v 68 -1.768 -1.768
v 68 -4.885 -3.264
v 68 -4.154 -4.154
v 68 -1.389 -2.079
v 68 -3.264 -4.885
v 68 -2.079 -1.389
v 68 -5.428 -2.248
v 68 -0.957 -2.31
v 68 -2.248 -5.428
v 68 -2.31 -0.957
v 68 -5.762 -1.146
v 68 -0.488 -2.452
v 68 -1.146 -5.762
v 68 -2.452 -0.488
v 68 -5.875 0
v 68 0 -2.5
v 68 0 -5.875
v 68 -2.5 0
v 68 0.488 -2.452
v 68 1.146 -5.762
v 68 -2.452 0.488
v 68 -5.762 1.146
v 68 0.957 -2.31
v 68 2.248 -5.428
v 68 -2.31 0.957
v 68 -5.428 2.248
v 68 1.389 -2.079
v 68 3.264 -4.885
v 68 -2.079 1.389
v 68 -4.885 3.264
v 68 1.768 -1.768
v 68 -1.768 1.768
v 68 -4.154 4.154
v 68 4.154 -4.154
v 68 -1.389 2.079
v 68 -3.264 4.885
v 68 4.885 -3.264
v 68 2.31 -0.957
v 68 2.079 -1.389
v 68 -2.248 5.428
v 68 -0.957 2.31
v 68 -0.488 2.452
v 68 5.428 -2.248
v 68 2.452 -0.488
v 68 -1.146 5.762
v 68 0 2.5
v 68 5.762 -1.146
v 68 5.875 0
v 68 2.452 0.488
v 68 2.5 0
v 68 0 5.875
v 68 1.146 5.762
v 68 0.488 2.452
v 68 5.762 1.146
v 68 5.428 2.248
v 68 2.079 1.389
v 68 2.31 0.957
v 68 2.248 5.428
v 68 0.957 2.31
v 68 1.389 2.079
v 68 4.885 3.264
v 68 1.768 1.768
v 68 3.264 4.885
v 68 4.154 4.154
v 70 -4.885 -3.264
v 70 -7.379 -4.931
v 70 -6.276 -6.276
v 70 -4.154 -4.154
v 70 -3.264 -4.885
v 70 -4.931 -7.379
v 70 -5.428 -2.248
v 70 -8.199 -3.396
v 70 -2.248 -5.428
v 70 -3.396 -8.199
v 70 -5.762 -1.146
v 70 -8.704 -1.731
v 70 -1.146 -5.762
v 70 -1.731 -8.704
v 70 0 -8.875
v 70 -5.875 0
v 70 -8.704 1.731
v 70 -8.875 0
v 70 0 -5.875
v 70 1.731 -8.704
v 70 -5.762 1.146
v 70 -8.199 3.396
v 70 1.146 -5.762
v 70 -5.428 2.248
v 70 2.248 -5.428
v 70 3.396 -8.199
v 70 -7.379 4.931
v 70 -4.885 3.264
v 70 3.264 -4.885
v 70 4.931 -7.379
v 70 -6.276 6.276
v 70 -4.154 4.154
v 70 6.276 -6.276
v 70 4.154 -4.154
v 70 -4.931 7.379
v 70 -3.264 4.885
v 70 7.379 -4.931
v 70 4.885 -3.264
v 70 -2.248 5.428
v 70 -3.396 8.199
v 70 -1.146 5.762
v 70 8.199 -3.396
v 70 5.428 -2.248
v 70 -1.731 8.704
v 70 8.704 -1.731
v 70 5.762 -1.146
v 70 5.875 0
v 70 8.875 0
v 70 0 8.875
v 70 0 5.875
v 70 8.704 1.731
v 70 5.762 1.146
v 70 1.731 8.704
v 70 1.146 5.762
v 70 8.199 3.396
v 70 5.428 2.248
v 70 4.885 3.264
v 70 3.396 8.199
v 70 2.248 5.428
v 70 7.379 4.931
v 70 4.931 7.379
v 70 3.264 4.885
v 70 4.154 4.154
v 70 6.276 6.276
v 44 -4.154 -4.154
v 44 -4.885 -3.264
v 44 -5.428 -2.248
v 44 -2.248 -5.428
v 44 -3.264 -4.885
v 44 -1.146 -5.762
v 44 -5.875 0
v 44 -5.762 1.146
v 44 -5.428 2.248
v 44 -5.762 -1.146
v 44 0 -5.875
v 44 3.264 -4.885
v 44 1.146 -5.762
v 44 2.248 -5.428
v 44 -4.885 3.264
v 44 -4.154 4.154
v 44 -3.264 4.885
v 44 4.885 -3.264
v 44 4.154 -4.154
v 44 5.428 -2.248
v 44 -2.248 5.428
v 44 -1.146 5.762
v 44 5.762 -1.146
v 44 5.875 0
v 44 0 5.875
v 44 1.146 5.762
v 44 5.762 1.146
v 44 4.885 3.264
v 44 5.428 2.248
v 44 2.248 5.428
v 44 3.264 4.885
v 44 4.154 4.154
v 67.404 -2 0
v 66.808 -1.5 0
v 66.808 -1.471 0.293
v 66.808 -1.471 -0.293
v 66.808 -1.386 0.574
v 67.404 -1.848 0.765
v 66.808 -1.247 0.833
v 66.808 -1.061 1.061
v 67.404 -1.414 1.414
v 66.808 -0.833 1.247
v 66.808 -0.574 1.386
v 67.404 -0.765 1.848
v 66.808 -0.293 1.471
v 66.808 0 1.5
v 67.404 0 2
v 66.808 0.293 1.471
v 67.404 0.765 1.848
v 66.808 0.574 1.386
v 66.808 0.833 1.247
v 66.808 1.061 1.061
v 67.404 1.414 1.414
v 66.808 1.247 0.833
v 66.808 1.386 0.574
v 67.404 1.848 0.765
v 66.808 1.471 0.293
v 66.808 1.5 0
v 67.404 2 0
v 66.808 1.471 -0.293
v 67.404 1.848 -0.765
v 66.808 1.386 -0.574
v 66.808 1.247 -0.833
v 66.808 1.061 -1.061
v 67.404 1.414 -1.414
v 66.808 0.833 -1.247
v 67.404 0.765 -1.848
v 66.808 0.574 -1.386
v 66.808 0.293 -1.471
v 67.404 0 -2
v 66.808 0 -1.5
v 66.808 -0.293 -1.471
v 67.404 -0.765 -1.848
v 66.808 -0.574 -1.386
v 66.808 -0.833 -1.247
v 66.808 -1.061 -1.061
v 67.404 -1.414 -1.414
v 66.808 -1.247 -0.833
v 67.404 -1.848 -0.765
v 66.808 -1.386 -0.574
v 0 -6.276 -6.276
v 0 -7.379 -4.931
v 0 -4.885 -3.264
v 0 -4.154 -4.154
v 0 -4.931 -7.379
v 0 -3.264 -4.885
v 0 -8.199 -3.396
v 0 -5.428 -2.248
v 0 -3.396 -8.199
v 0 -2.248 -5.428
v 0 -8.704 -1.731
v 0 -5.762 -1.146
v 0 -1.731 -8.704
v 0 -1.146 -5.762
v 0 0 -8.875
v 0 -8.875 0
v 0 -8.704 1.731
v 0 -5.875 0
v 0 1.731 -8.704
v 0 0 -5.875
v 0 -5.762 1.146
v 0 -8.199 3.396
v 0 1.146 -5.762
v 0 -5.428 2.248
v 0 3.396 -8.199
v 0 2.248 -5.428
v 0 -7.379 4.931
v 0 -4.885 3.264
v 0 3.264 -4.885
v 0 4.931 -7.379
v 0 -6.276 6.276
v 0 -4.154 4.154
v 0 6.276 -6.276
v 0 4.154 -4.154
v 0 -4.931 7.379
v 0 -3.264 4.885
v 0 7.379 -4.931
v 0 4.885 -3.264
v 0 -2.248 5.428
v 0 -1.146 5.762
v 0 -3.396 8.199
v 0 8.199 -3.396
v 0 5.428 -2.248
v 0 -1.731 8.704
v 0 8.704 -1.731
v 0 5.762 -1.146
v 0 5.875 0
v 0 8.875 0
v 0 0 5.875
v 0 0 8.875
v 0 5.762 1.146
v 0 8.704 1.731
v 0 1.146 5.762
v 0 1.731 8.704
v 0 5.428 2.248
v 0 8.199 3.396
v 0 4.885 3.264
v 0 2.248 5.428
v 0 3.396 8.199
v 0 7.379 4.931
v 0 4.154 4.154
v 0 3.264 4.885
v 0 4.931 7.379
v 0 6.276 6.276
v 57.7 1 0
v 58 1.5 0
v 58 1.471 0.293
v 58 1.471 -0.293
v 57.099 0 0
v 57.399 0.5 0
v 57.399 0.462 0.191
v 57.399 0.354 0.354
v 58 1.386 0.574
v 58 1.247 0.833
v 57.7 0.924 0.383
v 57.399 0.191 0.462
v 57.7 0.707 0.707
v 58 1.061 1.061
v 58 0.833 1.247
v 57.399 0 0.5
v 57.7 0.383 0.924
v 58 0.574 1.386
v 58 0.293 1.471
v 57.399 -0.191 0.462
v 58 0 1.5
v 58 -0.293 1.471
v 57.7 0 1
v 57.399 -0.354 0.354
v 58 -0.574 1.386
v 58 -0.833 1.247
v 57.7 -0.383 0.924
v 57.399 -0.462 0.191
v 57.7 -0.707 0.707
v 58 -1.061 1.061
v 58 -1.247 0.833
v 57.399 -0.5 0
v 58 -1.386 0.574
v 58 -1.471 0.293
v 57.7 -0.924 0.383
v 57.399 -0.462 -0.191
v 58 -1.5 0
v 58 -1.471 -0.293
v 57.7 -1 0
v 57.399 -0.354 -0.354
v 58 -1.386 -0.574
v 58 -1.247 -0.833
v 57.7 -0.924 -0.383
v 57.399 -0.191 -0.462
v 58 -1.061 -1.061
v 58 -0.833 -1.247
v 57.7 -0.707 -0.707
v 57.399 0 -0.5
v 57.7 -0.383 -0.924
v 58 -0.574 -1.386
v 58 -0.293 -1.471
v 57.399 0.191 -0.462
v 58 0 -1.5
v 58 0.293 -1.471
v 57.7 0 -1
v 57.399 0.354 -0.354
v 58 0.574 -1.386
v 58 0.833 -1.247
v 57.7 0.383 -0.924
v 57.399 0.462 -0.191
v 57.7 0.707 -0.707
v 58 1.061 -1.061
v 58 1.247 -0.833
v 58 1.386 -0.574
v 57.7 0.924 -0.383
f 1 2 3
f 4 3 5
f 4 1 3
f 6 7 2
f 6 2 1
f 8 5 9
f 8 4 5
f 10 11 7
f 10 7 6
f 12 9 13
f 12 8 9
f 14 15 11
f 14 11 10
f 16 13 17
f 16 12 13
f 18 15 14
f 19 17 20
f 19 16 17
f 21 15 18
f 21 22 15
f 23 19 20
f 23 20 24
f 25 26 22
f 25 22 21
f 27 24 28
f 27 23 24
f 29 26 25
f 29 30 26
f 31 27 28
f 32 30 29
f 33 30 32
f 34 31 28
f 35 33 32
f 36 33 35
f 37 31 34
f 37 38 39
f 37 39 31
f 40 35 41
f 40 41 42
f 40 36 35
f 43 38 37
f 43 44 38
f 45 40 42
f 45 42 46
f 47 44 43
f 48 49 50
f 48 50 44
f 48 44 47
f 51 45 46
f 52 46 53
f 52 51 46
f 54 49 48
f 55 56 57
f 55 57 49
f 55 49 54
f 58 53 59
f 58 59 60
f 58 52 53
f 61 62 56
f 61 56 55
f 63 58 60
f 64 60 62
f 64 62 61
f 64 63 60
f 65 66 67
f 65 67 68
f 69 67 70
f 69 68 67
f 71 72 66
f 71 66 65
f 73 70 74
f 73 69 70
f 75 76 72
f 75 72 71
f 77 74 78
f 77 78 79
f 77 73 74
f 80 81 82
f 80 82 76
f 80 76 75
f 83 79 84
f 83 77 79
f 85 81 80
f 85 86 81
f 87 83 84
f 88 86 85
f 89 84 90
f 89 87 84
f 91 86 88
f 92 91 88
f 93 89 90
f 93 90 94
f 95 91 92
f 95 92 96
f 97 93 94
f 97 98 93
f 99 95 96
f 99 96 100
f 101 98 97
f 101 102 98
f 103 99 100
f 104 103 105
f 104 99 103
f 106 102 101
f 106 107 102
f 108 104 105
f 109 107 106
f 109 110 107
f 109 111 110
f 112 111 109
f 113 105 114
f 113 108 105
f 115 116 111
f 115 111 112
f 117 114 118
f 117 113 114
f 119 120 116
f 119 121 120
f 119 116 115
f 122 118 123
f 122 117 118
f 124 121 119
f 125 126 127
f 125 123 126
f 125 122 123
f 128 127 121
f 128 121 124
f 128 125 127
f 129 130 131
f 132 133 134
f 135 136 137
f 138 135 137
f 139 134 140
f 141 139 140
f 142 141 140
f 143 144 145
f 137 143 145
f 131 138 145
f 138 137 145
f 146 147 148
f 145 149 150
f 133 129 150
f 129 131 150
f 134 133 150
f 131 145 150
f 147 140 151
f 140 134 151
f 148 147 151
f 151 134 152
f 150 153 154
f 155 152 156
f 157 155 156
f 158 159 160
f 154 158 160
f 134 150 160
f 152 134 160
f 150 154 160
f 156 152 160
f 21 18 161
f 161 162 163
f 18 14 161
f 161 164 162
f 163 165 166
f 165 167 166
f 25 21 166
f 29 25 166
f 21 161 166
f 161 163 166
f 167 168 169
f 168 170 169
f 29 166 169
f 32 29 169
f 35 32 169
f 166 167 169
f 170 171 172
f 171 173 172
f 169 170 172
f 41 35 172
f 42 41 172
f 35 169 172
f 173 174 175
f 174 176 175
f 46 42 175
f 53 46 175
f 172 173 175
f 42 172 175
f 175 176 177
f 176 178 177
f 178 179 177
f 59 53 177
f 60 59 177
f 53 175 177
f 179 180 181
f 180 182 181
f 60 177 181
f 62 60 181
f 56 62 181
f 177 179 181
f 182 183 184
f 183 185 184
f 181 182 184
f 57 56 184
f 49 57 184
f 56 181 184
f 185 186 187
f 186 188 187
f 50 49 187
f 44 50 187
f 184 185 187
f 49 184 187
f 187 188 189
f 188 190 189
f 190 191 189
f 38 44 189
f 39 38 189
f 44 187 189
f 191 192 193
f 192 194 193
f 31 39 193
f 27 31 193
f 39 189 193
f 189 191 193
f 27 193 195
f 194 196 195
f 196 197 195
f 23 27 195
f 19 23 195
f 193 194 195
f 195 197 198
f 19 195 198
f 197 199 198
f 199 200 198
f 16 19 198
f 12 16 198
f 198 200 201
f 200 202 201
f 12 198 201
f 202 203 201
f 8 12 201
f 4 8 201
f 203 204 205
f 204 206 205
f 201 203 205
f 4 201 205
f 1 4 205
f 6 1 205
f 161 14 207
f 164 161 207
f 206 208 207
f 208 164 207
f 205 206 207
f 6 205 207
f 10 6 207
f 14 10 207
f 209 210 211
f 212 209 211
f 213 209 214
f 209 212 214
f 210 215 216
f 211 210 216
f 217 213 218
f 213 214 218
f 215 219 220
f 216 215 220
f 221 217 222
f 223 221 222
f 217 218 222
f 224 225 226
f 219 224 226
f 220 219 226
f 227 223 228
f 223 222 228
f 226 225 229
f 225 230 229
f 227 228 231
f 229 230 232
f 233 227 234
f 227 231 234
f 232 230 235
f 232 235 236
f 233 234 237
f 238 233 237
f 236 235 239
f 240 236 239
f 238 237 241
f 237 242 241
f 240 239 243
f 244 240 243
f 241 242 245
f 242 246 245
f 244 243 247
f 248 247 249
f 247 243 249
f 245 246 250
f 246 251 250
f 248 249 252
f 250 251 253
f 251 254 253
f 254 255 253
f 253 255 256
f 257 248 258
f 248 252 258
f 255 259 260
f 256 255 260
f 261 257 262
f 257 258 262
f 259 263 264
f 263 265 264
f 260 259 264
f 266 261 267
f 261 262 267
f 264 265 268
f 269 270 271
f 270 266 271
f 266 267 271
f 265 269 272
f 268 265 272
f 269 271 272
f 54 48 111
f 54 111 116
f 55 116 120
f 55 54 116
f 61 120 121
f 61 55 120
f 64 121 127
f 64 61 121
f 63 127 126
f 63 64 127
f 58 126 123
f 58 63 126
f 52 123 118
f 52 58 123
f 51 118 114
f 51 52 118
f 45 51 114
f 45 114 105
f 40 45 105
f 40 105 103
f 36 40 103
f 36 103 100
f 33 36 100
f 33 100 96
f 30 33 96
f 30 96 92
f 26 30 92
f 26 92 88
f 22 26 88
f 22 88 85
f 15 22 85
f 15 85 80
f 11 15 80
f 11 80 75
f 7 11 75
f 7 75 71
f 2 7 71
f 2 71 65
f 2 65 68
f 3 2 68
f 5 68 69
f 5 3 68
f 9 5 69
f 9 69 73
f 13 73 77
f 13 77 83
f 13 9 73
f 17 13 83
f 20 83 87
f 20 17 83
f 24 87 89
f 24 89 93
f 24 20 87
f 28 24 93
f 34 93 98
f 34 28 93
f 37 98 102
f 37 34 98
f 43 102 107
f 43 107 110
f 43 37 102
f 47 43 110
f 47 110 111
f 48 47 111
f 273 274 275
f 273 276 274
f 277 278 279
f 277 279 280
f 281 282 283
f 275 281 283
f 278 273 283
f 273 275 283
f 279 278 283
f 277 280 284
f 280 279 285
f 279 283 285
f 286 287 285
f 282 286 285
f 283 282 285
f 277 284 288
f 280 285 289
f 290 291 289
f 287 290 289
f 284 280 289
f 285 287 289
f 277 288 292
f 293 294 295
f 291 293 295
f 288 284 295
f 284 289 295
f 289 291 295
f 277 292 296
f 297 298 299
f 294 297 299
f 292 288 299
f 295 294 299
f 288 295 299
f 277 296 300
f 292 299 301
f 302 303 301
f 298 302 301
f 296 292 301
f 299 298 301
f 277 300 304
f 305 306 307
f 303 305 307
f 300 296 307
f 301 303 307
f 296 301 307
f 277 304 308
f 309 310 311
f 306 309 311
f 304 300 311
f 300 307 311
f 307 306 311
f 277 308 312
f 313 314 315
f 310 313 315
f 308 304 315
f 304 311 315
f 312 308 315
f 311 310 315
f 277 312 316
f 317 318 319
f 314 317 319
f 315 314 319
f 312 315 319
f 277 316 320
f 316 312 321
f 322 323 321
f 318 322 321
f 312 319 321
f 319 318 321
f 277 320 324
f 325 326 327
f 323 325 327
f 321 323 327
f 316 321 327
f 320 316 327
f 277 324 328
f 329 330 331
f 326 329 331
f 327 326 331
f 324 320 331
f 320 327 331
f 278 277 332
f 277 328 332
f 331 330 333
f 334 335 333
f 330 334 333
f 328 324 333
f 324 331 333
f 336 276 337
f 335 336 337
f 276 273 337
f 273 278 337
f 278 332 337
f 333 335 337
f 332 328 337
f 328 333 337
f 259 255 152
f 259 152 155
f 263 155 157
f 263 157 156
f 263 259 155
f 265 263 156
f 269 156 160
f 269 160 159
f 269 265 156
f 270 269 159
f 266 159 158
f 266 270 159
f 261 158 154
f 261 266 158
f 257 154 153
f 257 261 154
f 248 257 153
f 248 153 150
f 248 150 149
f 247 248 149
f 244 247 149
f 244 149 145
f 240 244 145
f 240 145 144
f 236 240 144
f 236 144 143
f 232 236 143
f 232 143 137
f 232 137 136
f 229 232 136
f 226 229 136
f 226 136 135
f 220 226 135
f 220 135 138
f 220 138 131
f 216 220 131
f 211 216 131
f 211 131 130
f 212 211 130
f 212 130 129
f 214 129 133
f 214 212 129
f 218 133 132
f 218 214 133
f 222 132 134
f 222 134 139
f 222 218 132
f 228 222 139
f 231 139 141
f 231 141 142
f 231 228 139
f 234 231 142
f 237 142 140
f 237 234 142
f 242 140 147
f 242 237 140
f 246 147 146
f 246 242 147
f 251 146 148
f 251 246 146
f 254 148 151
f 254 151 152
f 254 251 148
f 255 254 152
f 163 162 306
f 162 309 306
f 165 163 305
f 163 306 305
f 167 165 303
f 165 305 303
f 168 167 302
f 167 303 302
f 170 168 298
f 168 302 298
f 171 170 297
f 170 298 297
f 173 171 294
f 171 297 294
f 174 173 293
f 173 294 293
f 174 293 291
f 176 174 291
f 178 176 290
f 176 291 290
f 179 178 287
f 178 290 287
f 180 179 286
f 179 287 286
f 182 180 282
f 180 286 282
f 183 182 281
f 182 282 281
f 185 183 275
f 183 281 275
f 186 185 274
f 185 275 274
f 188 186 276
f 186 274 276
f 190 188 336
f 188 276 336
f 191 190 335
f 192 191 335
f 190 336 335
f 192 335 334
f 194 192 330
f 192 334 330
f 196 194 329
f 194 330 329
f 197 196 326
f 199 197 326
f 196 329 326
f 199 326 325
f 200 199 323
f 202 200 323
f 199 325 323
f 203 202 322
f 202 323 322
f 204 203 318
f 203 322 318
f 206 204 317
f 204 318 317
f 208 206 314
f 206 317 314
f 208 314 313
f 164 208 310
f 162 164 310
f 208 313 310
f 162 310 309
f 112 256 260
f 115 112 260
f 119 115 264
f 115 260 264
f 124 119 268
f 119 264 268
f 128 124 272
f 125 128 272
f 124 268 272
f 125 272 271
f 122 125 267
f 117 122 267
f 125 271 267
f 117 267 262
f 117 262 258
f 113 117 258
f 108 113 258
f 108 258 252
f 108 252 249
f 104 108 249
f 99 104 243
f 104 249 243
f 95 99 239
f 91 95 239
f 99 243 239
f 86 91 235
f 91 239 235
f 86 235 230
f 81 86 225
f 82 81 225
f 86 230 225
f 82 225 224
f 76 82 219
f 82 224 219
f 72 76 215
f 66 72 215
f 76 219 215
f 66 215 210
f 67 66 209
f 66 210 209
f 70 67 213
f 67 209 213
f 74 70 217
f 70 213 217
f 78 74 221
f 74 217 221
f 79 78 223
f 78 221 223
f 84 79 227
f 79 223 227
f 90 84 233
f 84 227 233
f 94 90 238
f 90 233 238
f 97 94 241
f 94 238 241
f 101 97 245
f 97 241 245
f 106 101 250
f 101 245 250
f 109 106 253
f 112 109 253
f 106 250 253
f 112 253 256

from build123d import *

# Parameters (mm, degrees)
F0_R           = 8.875
F0_R_2         = 5.875
F1_DEPTH       = 70
F2_START       = 44
F2_DEPTH       = 24
F4_D           = 3
F4_DEPTH       = 10
F4_CSINK_D     = 5
F4_CSINK_ANGLE = 80
F4_TIP         = 0.9012909285


with BuildPart() as f1:
    # F0 (on Right) → F1 (new body)
    with BuildSketch(Plane.YZ):
        Circle(F0_R)
        Circle(F0_R_2, mode=Mode.SUBTRACT)
    extrude(amount=F1_DEPTH)

    # F0 (on Right) → F2 (join)
    with BuildSketch(Plane.YZ.offset(F2_START)):
        Circle(F0_R_2)
    extrude(amount=F2_DEPTH)

    # F4
    with Locations(Plane.YZ.offset(68)):
        with Locations((0, 0)):
            CounterSinkHole(F4_D / 2, F4_CSINK_D / 2, depth=F4_DEPTH, counter_sink_angle=F4_CSINK_ANGLE)
            with Locations((0, 0, -(F4_DEPTH + F4_TIP / 2))):  # 118° drill point
                Cone(0, F4_D / 2, F4_TIP, mode=Mode.SUBTRACT)


solid = f1.part
